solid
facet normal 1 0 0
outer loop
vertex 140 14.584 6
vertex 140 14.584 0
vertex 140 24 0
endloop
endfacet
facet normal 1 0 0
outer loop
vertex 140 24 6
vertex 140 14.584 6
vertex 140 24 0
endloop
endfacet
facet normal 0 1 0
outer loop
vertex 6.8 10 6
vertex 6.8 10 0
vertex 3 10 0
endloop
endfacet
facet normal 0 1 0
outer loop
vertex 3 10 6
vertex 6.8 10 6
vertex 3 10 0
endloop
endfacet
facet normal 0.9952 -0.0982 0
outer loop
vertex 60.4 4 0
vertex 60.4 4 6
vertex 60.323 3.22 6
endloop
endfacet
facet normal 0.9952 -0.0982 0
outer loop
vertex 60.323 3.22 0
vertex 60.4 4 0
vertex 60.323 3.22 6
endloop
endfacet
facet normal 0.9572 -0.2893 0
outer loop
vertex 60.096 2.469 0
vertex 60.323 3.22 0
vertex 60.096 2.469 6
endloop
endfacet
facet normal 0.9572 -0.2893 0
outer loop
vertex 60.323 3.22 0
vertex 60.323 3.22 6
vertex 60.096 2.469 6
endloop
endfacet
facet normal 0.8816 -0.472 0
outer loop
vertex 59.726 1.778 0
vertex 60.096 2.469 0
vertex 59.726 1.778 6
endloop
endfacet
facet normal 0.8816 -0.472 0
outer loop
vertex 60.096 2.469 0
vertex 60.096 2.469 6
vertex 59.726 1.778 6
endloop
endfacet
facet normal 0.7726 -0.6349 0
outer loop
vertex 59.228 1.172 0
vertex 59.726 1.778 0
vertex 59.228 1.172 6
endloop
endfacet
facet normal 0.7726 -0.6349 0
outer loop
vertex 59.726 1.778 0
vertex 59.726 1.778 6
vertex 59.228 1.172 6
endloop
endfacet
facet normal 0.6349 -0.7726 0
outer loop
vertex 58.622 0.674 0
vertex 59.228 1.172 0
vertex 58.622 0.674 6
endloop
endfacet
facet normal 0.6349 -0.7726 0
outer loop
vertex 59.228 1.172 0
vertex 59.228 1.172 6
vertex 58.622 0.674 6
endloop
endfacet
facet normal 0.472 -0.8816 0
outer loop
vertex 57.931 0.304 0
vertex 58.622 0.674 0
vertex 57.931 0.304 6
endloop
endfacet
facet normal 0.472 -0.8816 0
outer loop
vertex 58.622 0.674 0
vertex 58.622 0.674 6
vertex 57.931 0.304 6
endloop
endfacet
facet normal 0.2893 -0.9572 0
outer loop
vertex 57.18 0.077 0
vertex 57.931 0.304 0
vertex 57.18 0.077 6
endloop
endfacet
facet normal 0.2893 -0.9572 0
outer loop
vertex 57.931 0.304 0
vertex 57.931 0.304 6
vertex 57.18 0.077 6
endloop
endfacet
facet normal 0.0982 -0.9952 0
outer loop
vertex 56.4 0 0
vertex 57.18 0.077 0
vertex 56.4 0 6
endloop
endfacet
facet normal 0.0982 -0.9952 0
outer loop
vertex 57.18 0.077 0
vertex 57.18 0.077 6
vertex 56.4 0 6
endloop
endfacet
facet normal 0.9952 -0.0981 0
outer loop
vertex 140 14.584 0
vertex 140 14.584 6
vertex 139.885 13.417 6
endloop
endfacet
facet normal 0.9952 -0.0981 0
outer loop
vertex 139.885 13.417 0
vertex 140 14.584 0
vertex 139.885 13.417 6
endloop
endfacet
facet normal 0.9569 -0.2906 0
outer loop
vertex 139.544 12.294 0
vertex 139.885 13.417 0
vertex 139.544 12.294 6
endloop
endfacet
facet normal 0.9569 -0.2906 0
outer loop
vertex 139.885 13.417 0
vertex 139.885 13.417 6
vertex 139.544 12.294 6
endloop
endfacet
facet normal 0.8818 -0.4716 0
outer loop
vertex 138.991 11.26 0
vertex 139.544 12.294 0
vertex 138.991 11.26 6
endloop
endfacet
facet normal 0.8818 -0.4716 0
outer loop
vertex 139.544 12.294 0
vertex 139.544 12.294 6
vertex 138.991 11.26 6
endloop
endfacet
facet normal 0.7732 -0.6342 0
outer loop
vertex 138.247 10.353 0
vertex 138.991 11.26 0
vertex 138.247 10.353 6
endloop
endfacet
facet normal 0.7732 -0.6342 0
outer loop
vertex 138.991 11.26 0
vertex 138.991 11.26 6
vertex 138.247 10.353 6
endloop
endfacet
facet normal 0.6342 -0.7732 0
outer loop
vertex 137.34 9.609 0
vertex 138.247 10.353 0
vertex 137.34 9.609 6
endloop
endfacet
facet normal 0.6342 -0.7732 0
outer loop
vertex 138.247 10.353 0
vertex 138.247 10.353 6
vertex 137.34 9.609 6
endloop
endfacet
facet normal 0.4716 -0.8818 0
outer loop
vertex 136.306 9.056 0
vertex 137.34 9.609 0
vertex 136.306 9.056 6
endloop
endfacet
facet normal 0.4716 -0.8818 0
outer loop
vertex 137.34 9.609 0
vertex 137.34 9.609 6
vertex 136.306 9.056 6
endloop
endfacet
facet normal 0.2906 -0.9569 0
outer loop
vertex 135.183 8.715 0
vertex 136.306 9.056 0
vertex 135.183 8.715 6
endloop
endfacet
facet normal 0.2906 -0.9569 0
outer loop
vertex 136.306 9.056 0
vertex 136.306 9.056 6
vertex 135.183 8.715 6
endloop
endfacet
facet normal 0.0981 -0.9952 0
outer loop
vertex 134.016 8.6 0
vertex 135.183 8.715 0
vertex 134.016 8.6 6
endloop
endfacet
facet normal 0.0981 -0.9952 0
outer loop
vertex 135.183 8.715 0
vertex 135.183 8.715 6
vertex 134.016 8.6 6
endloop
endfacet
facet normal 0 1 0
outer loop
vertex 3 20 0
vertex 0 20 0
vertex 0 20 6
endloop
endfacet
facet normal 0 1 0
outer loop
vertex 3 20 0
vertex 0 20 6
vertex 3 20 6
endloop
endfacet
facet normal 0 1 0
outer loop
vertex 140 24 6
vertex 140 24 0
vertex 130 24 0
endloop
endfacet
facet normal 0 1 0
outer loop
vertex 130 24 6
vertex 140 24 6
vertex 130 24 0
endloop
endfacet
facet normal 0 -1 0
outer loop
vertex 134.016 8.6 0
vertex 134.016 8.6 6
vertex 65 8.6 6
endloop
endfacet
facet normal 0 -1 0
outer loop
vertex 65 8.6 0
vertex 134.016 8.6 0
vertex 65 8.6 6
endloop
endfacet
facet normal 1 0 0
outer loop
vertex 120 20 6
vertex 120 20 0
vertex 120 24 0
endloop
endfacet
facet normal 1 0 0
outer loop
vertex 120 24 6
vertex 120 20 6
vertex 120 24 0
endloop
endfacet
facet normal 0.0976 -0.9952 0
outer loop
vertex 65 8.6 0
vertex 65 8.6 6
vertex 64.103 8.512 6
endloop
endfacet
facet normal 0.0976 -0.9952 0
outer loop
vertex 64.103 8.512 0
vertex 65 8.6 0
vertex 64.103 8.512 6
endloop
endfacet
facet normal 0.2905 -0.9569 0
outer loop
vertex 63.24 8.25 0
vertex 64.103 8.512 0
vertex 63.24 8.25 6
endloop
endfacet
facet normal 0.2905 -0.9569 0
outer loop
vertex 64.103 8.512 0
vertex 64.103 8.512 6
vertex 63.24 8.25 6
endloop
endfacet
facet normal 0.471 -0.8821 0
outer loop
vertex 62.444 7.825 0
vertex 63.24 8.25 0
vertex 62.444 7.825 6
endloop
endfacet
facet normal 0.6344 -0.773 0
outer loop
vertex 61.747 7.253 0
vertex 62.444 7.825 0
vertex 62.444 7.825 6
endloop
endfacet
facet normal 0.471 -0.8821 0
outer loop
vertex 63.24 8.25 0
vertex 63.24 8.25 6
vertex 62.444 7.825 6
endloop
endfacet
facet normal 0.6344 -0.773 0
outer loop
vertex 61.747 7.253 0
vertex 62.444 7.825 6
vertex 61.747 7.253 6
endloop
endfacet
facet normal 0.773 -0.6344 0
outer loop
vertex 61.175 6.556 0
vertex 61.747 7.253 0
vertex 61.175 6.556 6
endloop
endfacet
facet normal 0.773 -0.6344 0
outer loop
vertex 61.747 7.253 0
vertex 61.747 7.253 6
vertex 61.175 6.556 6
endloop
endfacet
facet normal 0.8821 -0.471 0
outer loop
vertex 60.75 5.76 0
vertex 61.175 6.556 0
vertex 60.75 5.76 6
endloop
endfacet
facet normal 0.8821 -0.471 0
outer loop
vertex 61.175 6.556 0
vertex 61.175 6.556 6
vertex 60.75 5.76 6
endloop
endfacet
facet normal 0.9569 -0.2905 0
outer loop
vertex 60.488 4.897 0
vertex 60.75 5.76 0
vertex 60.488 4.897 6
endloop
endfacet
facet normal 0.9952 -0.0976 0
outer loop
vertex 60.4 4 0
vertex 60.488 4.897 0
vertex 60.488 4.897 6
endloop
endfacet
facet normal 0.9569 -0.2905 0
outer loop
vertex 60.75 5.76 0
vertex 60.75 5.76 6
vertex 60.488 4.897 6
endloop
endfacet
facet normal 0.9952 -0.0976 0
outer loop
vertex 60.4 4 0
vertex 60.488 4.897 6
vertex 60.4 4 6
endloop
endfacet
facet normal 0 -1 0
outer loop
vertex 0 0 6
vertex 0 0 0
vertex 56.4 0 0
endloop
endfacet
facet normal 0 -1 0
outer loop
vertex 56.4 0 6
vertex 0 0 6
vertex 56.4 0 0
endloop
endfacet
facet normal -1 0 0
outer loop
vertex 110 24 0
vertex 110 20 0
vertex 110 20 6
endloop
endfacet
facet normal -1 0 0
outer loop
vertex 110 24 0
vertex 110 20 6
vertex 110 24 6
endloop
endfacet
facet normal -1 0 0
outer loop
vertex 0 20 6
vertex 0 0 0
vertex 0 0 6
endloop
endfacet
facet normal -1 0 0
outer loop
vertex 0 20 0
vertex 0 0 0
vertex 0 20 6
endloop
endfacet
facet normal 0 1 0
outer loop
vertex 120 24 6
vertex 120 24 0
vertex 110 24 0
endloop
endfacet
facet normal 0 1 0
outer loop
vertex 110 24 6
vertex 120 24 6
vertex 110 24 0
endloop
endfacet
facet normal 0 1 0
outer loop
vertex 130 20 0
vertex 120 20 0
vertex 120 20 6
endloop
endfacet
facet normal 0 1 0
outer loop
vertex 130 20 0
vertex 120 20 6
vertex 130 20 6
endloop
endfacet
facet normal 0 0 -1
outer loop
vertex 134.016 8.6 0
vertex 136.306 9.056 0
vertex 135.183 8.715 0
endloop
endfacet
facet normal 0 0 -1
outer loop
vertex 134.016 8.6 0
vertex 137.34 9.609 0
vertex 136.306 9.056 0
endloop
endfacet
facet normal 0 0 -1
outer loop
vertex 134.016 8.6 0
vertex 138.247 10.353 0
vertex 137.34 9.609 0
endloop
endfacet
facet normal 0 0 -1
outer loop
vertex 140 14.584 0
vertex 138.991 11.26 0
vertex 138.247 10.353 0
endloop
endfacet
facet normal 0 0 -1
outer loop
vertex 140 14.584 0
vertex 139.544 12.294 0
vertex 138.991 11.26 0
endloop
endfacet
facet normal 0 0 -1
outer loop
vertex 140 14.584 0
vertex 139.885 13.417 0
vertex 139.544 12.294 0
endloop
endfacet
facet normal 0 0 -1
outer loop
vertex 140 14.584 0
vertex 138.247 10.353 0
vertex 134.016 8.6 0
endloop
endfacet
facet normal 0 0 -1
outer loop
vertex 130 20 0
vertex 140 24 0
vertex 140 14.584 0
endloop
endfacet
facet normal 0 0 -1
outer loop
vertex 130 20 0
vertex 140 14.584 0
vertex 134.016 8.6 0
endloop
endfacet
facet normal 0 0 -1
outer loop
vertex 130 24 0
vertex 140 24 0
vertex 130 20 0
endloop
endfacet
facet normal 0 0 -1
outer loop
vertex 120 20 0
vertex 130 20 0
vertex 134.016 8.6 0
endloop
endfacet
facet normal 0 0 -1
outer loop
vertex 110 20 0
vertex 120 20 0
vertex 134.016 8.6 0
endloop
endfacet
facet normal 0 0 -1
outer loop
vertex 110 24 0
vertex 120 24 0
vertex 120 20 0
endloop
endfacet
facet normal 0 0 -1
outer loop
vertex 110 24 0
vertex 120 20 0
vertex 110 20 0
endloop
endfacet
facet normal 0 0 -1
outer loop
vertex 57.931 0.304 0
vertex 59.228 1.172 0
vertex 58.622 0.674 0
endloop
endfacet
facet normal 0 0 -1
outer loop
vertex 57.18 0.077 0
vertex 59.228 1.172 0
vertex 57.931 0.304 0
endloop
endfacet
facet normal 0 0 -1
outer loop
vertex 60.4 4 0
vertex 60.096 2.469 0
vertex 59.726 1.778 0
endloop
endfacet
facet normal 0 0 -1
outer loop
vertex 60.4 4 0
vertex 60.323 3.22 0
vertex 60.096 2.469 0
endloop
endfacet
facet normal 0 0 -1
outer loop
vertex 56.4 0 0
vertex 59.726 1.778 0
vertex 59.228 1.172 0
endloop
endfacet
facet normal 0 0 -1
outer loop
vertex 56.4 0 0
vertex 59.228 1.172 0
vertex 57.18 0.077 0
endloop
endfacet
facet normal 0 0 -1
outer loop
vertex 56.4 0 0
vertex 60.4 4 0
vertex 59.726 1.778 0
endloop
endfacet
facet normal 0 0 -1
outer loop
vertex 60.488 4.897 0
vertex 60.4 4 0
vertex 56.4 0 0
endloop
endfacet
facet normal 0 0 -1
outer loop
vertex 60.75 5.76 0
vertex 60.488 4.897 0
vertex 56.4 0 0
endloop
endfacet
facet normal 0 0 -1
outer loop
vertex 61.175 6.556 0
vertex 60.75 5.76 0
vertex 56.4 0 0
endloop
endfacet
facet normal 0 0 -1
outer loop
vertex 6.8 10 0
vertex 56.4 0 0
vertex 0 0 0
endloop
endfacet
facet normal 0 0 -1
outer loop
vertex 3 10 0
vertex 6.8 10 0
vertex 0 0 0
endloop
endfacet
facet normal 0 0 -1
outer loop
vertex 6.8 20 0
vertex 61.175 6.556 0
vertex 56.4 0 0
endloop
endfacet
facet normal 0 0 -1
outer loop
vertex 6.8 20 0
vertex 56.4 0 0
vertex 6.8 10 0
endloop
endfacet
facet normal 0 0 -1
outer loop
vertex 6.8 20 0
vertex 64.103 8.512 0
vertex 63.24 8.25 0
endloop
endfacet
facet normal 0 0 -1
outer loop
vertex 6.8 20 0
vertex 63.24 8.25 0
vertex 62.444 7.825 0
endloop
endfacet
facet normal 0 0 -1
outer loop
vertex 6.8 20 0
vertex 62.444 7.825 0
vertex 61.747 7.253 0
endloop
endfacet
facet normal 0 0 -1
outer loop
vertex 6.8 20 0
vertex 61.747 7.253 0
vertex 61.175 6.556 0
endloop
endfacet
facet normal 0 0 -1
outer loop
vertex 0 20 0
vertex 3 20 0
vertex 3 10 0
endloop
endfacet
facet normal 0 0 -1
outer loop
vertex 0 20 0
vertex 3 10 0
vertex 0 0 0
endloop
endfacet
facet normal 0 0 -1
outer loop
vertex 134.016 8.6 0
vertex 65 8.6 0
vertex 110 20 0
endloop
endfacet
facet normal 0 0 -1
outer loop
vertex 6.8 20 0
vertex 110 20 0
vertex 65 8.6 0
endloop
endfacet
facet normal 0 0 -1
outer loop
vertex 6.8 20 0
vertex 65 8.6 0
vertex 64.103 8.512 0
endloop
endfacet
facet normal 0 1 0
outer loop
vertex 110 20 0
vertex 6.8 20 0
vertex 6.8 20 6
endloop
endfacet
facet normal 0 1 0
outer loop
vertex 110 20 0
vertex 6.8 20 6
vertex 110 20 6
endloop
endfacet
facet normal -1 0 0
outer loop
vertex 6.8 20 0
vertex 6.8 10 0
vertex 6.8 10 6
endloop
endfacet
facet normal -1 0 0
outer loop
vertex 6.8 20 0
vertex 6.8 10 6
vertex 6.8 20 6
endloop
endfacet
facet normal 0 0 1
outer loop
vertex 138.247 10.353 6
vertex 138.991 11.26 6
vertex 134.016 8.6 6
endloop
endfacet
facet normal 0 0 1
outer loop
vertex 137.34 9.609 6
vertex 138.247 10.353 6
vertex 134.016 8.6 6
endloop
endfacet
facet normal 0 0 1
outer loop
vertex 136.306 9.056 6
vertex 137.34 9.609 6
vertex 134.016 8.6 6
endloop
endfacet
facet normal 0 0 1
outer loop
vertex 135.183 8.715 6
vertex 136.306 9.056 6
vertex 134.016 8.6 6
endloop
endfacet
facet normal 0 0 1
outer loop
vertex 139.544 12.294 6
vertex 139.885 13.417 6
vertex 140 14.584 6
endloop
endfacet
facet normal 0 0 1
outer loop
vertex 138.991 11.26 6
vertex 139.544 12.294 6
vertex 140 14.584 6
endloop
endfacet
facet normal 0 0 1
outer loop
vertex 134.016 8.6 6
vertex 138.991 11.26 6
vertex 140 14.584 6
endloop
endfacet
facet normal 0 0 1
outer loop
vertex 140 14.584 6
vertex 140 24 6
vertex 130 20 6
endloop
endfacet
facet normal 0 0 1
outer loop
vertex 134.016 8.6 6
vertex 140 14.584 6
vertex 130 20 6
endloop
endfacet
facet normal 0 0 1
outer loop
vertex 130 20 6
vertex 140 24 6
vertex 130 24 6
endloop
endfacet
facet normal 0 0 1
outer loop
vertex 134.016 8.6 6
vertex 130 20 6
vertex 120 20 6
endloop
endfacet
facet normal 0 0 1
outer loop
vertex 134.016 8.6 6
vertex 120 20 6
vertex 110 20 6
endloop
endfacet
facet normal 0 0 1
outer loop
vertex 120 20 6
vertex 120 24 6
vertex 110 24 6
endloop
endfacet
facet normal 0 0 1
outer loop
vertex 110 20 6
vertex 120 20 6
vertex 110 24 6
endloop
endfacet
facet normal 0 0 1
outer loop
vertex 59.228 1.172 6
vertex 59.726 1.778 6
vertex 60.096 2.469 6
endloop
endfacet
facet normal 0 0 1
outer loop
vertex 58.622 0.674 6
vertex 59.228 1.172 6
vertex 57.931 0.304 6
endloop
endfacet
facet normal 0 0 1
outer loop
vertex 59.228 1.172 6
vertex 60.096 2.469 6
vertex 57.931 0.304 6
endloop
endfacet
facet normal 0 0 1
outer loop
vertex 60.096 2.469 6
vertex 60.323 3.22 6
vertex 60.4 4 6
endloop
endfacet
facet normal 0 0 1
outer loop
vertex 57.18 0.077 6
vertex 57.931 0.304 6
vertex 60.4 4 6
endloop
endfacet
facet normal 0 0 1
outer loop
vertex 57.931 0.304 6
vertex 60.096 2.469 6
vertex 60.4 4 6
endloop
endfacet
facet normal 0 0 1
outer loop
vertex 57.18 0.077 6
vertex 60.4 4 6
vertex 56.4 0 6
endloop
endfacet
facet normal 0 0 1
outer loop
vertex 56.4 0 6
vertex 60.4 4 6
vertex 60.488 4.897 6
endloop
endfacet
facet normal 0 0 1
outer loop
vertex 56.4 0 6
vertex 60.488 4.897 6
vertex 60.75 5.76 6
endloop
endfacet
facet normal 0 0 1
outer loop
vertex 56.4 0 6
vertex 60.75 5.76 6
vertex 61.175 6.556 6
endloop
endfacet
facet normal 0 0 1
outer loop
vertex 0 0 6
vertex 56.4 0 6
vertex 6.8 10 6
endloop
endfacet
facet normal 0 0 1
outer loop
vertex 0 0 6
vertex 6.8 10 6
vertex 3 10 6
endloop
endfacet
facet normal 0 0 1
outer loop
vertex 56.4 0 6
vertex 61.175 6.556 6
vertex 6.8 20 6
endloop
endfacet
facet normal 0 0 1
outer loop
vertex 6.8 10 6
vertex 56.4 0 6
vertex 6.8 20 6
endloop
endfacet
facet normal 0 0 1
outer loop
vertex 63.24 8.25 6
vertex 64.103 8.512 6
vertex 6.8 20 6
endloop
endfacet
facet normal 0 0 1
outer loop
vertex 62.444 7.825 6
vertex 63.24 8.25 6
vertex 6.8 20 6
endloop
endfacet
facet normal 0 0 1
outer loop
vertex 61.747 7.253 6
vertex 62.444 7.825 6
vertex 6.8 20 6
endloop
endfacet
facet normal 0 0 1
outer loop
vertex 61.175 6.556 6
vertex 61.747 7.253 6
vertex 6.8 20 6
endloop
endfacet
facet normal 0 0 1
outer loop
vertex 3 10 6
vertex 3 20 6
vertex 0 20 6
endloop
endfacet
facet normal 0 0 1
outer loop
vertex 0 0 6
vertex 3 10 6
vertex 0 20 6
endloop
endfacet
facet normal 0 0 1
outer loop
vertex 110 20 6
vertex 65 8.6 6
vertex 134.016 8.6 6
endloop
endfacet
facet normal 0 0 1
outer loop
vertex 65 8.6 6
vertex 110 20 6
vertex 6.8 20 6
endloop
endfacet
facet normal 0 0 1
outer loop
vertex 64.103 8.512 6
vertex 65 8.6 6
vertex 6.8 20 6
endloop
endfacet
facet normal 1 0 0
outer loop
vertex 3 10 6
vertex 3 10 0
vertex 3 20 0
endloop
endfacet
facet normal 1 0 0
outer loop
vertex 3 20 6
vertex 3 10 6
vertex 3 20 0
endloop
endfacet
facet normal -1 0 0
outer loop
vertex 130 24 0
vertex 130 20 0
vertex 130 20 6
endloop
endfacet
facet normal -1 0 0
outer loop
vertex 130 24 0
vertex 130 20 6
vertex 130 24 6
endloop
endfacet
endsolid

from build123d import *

# Parameters (mm, degrees)
SKIZZE1_W                       = 140
SKIZZE1_H                       = 20
AUFSATZ_LINEAR_AUSTRAGEN1_DEPTH = 6
SKIZZE2_W                       = 10
SKIZZE2_H                       = 4
AUFSATZ_LINEAR_AUSTRAGEN2_DEPTH = 6
SCHNITT_LINEAR_AUSTRAGEN1_REACH = 8
SKIZZE3_W                       = 3.8
SKIZZE3_H                       = 10
SCHNITT_LINEAR_AUSTRAGEN2_REACH = 8


with BuildPart() as part:
    # Skizze1 → Aufsatz-Linear austragen1 (new body)
    with BuildSketch(Plane.XY):
        with Locations((70, 10)):
            Rectangle(SKIZZE1_W, SKIZZE1_H)
    extrude(amount=AUFSATZ_LINEAR_AUSTRAGEN1_DEPTH)

    # Skizze2 → Aufsatz-Linear austragen2 (add)
    with BuildSketch(Plane(origin=(0, 0, 0), x_dir=(-1, 0, 0), z_dir=(0, 0, -1))):
        with Locations((-135, 22)):
            Rectangle(SKIZZE2_W, SKIZZE2_H)
        with Locations((-115, 22)):
            Rectangle(SKIZZE2_W, SKIZZE2_H)
    extrude(amount=-AUFSATZ_LINEAR_AUSTRAGEN2_DEPTH)

    # Skizze3 → Schnitt-Linear austragen1 (cut, up to next)
    with BuildSketch(Plane(origin=(0, 0, 0), x_dir=(-1, 0, 0), z_dir=(0, 0, -1)), mode=Mode.PRIVATE) as schnitt_linear_austragen1_sk1:
        with Locations((-4.9, 15)):
            Rectangle(SKIZZE3_W, SKIZZE3_H)
    schnitt_linear_austragen1_tool1 = extrude(schnitt_linear_austragen1_sk1.sketch, amount=-SCHNITT_LINEAR_AUSTRAGEN1_REACH, mode=Mode.PRIVATE) & part.part
    add(schnitt_linear_austragen1_tool1.solids().sort_by_distance((4.9, 15, 0))[0], mode=Mode.SUBTRACT)

    # Skizze4 → Schnitt-Linear austragen2 (cut, up to next)
    with BuildSketch(Plane.XY.offset(6), mode=Mode.PRIVATE) as schnitt_linear_austragen2_sk1:
        with BuildLine():
            Line((134.01576743, 8.6), (65, 8.6))
            ThreePointArc((65, 8.6), (61.747308807, 7.252691193), (60.4, 4))
            ThreePointArc((60.4, 4), (59.228427125, 1.171572875), (56.4, 0))
            Line((56.4, 0), (140, 0))
            Line((140, 0), (140, 14.58423257))
            ThreePointArc((140, 14.58423257), (138.247258861, 10.352741139), (134.01576743, 8.6))
        make_face()
    schnitt_linear_austragen2_tool1 = extrude(schnitt_linear_austragen2_sk1.sketch, amount=-SCHNITT_LINEAR_AUSTRAGEN2_REACH, mode=Mode.PRIVATE) & part.part
    add(schnitt_linear_austragen2_tool1.solids().sort_by_distance((100.680271, 4.324252, 6))[0], mode=Mode.SUBTRACT)


solid = part.part
